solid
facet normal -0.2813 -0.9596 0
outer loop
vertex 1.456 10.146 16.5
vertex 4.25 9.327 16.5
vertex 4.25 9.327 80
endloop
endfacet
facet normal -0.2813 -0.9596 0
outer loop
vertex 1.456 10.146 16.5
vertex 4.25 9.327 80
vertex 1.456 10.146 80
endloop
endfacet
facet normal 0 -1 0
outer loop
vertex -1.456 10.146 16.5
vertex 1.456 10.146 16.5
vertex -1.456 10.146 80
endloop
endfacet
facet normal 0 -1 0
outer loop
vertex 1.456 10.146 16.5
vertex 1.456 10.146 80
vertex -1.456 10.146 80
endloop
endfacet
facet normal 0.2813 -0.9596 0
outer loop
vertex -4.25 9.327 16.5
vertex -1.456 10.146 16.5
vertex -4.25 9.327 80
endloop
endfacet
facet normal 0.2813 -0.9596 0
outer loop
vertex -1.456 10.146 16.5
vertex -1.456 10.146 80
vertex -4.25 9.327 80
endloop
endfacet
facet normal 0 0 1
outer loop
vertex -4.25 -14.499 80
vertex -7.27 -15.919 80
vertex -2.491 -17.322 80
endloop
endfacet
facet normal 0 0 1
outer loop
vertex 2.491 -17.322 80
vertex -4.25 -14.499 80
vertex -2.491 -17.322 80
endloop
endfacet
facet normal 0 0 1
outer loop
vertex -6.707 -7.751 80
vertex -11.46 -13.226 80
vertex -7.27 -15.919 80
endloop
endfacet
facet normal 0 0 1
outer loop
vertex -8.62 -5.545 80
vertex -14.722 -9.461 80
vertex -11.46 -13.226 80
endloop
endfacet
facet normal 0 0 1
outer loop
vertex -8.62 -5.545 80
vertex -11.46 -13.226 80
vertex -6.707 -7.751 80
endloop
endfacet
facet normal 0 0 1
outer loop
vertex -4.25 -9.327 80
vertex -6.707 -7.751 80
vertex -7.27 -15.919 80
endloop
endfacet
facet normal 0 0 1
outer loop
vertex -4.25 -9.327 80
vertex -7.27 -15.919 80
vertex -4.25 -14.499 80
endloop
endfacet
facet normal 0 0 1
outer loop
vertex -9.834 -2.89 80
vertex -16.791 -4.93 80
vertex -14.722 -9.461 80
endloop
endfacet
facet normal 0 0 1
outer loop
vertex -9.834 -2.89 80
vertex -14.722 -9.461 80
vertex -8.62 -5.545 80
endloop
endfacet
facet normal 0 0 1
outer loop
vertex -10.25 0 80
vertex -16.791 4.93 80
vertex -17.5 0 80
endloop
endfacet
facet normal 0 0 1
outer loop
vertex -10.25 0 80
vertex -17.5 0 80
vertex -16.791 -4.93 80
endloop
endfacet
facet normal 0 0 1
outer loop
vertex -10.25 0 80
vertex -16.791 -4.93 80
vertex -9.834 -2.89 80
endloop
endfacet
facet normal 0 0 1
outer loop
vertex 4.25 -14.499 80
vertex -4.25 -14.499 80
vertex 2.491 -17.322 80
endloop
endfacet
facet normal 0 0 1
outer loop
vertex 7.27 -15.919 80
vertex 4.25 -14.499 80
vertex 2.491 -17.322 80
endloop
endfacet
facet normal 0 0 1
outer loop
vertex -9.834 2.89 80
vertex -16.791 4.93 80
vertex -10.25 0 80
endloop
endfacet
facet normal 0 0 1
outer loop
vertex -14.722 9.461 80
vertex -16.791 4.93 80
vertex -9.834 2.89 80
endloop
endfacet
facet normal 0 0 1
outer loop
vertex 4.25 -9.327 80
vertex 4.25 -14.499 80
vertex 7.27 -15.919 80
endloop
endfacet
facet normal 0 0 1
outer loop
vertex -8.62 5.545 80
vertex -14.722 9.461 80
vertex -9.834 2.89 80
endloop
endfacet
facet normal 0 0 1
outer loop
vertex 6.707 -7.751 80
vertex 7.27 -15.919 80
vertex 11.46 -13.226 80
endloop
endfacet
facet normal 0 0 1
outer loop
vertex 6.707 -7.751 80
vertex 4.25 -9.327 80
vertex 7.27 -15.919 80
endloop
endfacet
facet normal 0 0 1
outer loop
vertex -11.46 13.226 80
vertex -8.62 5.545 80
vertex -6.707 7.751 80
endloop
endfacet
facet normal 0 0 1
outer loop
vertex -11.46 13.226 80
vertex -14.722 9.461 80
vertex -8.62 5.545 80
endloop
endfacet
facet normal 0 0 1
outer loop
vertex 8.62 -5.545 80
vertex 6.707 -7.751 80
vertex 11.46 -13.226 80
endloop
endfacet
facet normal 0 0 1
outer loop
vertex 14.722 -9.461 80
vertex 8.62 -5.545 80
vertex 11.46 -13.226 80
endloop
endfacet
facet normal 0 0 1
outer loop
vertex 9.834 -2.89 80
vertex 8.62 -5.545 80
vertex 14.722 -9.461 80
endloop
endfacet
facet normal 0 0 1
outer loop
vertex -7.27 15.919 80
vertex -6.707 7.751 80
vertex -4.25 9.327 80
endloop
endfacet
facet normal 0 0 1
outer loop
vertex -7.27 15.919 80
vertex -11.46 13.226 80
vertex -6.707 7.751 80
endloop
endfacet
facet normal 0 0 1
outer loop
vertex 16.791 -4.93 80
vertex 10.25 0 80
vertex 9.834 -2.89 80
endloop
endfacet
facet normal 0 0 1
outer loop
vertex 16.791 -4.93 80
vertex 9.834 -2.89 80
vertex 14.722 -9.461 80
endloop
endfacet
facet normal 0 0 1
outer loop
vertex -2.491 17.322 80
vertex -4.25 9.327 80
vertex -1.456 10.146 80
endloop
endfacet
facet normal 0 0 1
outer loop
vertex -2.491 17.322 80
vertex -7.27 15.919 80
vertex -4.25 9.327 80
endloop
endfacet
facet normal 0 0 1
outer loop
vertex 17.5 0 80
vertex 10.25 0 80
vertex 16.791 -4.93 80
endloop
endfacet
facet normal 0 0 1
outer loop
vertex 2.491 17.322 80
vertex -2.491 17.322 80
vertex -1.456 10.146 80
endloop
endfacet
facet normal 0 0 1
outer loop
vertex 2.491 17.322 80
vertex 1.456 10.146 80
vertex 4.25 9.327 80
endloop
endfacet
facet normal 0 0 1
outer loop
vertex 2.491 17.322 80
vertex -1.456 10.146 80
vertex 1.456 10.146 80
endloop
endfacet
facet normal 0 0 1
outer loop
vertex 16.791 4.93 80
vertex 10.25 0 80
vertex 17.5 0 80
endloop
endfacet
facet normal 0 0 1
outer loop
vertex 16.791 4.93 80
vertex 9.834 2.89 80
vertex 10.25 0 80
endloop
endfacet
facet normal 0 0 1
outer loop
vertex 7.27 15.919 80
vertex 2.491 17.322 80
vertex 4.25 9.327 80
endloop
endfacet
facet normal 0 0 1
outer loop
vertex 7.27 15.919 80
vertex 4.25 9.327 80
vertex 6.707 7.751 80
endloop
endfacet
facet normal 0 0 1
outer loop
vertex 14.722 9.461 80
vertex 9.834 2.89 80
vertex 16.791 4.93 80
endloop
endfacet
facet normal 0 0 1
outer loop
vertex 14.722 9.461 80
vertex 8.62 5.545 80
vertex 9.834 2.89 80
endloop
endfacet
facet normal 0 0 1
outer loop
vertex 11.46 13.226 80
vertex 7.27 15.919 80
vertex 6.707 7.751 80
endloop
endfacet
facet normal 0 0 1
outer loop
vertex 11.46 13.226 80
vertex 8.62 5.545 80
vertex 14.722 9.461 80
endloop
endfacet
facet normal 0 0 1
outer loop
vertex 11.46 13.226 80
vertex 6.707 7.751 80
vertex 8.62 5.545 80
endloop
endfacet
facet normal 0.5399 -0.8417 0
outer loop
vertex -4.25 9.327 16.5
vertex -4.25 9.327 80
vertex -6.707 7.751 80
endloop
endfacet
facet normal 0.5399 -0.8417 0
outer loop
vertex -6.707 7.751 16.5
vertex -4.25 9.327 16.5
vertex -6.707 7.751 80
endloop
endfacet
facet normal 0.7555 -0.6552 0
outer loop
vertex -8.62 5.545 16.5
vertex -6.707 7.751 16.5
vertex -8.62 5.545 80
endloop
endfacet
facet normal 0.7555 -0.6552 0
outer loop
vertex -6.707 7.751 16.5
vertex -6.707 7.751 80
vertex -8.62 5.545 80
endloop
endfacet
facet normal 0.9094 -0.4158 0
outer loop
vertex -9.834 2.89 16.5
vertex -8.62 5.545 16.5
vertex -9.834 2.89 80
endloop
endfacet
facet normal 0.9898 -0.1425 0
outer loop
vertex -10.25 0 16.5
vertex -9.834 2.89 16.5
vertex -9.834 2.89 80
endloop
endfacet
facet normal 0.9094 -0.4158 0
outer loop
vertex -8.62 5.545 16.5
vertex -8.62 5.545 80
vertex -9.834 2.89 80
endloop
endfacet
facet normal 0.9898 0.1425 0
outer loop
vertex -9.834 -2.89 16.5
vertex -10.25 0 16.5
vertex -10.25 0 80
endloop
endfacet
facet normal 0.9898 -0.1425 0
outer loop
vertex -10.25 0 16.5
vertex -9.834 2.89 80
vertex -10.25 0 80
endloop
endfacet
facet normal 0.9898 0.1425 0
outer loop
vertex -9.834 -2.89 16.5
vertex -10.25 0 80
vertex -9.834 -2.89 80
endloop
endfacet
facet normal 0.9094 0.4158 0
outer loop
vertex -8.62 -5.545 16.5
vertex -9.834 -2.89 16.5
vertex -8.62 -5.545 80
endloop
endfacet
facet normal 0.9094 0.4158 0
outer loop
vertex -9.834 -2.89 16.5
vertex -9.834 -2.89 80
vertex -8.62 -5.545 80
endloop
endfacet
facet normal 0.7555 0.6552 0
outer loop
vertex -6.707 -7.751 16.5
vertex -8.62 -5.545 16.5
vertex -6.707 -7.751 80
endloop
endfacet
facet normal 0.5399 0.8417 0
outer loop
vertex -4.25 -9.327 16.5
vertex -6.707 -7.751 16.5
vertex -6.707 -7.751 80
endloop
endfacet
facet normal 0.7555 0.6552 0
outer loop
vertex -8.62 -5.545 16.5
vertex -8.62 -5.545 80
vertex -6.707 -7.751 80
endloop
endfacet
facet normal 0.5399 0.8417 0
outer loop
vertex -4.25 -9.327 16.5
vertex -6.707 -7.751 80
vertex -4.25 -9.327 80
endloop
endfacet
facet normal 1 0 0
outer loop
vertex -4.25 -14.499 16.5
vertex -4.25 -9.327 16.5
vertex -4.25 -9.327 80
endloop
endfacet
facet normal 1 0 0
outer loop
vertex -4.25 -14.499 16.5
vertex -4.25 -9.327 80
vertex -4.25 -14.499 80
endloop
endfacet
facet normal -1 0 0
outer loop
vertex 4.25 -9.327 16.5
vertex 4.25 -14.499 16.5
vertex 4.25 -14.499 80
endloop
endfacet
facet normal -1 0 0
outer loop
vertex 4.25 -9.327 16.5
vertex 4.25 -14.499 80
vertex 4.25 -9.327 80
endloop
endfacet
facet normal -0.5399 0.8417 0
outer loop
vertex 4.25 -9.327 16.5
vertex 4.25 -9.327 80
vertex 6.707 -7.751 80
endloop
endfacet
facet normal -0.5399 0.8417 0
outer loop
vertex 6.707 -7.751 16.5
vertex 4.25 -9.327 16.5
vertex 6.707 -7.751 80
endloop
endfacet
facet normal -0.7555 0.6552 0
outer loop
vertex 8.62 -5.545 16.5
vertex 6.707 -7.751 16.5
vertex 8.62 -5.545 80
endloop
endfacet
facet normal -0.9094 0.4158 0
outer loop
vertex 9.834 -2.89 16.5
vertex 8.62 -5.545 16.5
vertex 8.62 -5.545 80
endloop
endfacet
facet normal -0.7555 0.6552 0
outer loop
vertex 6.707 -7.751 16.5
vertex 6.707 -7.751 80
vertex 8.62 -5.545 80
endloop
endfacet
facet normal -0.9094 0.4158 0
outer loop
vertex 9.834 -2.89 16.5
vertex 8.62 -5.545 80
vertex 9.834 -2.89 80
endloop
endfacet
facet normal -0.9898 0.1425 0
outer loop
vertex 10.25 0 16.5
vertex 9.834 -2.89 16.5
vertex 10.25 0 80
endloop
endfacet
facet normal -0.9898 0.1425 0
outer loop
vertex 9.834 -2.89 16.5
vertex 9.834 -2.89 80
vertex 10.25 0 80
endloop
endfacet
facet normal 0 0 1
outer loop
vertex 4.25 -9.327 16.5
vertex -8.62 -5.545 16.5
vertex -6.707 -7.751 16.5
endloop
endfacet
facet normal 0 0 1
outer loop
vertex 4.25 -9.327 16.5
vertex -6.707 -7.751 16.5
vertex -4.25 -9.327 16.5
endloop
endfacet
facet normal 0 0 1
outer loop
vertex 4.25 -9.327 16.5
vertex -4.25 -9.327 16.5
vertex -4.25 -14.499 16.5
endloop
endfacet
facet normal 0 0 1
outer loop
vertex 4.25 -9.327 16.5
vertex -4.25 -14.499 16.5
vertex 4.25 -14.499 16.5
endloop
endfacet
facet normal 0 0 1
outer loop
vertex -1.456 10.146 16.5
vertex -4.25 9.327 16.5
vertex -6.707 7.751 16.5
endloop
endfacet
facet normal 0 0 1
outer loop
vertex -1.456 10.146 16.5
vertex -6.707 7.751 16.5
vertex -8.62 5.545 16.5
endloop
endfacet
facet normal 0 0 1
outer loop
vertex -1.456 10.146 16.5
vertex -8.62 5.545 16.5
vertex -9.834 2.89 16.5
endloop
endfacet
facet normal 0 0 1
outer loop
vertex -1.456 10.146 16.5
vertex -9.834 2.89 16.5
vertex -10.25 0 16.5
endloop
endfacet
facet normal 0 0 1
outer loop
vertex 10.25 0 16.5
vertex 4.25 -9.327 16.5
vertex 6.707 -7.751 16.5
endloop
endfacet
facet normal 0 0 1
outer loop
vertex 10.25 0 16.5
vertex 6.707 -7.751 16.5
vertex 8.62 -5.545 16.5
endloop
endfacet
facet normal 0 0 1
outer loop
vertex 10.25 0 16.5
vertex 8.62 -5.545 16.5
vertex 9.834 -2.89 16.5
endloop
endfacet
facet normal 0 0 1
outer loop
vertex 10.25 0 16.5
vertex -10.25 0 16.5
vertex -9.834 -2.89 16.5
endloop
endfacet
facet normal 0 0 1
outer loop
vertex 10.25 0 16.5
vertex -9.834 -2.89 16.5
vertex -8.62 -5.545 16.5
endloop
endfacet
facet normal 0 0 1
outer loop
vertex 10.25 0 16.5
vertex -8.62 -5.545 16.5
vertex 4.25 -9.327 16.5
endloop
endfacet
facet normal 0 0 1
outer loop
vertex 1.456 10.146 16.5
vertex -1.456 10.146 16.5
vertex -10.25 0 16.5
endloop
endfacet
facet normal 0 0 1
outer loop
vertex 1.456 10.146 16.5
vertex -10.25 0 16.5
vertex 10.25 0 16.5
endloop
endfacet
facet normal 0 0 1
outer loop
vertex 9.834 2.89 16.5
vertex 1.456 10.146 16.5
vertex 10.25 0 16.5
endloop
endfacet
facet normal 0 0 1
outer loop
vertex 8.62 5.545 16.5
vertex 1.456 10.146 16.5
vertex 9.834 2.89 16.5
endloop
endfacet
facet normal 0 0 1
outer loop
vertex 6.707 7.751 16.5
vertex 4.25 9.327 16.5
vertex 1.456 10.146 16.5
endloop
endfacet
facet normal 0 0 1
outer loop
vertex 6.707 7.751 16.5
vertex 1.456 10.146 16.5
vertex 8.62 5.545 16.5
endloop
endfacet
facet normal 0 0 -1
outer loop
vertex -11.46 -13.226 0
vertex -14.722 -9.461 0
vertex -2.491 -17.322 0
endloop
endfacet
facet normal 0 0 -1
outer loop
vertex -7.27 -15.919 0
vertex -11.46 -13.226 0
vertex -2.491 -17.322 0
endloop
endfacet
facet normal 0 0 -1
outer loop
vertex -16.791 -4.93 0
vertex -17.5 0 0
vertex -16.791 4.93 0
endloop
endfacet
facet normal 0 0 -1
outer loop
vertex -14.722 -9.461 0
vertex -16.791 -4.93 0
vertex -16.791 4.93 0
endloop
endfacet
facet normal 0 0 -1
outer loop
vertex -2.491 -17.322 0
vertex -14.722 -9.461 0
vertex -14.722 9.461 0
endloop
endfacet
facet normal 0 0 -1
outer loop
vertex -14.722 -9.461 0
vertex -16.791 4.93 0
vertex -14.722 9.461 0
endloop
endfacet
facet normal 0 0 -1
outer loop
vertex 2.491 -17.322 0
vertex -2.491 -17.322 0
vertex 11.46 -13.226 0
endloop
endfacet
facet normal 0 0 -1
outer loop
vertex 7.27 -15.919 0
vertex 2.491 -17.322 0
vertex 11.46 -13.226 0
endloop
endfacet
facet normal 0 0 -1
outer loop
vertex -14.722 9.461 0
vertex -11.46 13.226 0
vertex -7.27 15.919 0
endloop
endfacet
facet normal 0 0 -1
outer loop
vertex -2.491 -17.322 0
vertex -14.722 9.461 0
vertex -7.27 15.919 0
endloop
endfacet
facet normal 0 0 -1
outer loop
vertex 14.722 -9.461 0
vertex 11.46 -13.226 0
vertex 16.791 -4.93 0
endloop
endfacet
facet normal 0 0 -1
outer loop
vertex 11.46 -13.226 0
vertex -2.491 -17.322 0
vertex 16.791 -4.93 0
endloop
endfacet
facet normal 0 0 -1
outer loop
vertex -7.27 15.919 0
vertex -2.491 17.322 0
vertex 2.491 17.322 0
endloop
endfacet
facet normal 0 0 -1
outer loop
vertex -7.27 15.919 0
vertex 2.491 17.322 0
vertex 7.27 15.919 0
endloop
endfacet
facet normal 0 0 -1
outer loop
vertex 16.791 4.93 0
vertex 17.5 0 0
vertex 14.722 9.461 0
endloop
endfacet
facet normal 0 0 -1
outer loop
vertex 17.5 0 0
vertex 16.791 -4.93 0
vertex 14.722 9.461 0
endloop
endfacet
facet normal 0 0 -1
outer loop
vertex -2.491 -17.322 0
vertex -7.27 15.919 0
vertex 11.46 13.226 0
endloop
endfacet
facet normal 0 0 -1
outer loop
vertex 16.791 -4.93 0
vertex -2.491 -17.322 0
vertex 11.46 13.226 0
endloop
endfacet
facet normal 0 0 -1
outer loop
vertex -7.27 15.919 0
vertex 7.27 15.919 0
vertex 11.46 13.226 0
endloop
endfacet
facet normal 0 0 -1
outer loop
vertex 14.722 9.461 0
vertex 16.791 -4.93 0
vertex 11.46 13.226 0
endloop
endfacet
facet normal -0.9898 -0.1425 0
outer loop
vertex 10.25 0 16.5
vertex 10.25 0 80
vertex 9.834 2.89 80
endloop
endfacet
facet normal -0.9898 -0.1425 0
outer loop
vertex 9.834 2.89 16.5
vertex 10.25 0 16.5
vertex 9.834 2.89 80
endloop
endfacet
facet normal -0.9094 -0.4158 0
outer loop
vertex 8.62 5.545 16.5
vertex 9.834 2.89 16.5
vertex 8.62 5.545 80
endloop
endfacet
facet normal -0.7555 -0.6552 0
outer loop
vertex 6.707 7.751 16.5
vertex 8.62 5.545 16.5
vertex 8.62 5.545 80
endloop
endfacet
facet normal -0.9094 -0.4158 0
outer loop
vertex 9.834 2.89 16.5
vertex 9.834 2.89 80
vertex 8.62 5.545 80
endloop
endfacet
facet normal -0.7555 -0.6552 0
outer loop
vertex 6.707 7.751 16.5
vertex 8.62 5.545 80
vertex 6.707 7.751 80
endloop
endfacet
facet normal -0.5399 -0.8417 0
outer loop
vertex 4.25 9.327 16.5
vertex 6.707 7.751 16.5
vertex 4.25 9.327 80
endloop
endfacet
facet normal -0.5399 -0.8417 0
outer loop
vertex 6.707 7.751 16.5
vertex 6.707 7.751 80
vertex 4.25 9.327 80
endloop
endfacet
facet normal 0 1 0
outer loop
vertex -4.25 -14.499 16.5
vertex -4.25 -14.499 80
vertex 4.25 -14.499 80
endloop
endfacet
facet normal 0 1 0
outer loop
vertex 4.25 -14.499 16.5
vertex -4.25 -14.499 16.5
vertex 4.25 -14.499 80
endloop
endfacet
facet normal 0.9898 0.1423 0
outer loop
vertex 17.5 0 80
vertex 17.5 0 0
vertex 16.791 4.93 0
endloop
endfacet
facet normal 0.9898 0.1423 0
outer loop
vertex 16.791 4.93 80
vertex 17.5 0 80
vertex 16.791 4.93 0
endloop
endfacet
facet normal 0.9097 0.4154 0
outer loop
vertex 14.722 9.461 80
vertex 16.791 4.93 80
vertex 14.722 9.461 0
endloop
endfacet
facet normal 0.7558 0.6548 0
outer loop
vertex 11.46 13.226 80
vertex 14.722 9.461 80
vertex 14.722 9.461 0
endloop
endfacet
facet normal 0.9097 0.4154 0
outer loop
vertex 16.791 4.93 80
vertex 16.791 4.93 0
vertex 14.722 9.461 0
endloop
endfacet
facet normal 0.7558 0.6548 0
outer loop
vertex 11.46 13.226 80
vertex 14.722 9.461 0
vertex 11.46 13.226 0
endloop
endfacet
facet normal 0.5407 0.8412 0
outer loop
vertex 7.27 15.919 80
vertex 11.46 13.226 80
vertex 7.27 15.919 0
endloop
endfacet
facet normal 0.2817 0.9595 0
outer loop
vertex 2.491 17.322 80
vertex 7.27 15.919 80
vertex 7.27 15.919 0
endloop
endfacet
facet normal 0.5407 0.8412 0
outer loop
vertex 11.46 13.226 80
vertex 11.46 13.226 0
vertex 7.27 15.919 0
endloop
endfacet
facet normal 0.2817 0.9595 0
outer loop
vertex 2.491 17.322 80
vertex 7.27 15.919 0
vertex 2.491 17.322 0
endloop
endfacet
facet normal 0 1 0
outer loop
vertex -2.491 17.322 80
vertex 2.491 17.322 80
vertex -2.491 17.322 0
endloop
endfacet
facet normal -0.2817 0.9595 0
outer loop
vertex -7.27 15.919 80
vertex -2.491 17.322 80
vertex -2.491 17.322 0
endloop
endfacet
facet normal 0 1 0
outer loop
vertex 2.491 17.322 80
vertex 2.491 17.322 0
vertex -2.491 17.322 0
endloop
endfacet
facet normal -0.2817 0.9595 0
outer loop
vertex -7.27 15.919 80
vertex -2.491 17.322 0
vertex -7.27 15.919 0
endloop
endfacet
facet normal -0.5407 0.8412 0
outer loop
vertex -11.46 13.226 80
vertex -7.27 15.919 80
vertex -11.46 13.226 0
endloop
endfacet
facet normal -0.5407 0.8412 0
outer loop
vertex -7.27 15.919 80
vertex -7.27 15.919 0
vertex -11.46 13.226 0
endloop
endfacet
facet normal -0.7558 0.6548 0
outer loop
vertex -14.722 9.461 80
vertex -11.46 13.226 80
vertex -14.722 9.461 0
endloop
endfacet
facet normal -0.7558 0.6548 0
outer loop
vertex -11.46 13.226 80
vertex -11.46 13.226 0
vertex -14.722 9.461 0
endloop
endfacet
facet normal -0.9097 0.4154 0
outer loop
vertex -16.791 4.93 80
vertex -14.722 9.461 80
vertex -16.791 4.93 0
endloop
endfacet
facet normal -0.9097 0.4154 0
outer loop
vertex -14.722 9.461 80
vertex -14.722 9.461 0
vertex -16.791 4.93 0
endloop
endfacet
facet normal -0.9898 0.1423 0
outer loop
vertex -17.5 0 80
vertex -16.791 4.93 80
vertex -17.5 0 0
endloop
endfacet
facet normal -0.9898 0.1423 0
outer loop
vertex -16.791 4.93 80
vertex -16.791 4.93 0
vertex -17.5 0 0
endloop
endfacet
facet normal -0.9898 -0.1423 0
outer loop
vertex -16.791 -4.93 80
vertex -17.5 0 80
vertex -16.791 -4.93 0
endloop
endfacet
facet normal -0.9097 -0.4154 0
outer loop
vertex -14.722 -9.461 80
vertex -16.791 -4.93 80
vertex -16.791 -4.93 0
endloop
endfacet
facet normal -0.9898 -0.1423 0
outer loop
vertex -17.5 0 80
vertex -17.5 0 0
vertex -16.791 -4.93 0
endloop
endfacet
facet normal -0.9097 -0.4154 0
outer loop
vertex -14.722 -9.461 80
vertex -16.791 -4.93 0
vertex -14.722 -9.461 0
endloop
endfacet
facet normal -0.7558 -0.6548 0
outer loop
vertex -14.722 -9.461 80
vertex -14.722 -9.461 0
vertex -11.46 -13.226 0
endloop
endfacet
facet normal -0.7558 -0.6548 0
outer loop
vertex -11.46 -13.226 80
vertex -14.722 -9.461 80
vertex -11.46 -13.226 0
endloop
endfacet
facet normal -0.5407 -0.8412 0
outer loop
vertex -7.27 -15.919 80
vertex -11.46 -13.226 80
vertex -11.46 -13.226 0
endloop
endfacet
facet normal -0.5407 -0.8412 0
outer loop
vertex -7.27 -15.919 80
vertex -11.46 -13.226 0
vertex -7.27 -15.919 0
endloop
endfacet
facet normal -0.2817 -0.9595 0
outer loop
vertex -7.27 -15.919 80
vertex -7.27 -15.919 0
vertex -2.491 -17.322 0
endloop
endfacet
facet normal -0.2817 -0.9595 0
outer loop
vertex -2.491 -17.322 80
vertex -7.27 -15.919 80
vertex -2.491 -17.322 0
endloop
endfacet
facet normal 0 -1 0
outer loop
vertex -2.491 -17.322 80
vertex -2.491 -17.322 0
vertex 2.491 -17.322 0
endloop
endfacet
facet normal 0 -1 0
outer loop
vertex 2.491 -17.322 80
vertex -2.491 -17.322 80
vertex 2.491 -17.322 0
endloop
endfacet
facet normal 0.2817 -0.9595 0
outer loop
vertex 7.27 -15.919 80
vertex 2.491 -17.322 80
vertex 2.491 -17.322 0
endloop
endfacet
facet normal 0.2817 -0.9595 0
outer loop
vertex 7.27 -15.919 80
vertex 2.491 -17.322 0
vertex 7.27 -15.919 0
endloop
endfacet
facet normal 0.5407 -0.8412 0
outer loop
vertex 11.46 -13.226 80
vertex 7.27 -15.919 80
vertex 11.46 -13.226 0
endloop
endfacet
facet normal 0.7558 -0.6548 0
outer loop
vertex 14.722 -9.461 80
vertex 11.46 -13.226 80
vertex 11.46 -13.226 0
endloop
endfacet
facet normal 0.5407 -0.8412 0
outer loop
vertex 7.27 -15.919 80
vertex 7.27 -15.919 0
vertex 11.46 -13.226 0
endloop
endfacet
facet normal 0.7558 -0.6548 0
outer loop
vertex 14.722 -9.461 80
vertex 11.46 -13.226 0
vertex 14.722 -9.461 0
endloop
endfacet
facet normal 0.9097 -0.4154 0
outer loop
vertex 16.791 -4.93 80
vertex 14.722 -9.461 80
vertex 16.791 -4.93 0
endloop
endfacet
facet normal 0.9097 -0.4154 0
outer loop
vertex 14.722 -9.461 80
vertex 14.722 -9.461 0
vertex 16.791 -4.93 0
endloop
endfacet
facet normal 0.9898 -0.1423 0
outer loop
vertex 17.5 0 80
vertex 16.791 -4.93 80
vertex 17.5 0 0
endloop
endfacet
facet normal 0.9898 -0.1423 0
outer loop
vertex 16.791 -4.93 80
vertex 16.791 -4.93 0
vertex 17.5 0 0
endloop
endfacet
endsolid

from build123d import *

# Parameters (mm, degrees)
F0_R     = 17.5
F1_DEPTH = 80
F3_DEPTH = 63.5


with BuildPart() as f1:
    # F0 (on Top) → F1 (new body)
    with BuildSketch(Plane.XY):
        Circle(F0_R)
    extrude(amount=F1_DEPTH)

    # F2 (on face) → F3 (cut)
    with BuildSketch(Plane.XY.offset(80)):
        with BuildLine():
            Line((4.25, -14.4989), (4.25, -9.3273790531))
            ThreePointArc((4.25, -9.3273790531), (0, -10.25), (-4.25, -9.3273790531))
            Line((-4.25, -9.3273790531), (-4.25, -14.4989))
            Line((-4.25, -14.4989), (4.25, -14.4989))
        make_face()
        with BuildLine():
            ThreePointArc((4.25, -9.3273790531), (8.6204698248, -5.5452682532), (10.25, 0))
            ThreePointArc((10.25, 0), (8.6204698248, 5.5452682532), (4.25, 9.3273790531))
            Line((4.25, 9.3273790531), (4.25, -9.3273790531))
        make_face()
        with BuildLine():
            Line((4.25, -9.3273790531), (4.25, 9.3273790531))
            ThreePointArc((4.25, 9.3273790531), (0, 10.25), (-4.25, 9.3273790531))
            Line((-4.25, 9.3273790531), (-4.25, -9.3273790531))
            ThreePointArc((-4.25, -9.3273790531), (0, -10.25), (4.25, -9.3273790531))
        make_face()
        with BuildLine():
            Line((-4.25, -9.3273790531), (-4.25, 9.3273790531))
            ThreePointArc((-4.25, 9.3273790531), (-10.25, 0), (-4.25, -9.3273790531))
        make_face()
    extrude(amount=-F3_DEPTH, mode=Mode.SUBTRACT)


solid = f1.part
